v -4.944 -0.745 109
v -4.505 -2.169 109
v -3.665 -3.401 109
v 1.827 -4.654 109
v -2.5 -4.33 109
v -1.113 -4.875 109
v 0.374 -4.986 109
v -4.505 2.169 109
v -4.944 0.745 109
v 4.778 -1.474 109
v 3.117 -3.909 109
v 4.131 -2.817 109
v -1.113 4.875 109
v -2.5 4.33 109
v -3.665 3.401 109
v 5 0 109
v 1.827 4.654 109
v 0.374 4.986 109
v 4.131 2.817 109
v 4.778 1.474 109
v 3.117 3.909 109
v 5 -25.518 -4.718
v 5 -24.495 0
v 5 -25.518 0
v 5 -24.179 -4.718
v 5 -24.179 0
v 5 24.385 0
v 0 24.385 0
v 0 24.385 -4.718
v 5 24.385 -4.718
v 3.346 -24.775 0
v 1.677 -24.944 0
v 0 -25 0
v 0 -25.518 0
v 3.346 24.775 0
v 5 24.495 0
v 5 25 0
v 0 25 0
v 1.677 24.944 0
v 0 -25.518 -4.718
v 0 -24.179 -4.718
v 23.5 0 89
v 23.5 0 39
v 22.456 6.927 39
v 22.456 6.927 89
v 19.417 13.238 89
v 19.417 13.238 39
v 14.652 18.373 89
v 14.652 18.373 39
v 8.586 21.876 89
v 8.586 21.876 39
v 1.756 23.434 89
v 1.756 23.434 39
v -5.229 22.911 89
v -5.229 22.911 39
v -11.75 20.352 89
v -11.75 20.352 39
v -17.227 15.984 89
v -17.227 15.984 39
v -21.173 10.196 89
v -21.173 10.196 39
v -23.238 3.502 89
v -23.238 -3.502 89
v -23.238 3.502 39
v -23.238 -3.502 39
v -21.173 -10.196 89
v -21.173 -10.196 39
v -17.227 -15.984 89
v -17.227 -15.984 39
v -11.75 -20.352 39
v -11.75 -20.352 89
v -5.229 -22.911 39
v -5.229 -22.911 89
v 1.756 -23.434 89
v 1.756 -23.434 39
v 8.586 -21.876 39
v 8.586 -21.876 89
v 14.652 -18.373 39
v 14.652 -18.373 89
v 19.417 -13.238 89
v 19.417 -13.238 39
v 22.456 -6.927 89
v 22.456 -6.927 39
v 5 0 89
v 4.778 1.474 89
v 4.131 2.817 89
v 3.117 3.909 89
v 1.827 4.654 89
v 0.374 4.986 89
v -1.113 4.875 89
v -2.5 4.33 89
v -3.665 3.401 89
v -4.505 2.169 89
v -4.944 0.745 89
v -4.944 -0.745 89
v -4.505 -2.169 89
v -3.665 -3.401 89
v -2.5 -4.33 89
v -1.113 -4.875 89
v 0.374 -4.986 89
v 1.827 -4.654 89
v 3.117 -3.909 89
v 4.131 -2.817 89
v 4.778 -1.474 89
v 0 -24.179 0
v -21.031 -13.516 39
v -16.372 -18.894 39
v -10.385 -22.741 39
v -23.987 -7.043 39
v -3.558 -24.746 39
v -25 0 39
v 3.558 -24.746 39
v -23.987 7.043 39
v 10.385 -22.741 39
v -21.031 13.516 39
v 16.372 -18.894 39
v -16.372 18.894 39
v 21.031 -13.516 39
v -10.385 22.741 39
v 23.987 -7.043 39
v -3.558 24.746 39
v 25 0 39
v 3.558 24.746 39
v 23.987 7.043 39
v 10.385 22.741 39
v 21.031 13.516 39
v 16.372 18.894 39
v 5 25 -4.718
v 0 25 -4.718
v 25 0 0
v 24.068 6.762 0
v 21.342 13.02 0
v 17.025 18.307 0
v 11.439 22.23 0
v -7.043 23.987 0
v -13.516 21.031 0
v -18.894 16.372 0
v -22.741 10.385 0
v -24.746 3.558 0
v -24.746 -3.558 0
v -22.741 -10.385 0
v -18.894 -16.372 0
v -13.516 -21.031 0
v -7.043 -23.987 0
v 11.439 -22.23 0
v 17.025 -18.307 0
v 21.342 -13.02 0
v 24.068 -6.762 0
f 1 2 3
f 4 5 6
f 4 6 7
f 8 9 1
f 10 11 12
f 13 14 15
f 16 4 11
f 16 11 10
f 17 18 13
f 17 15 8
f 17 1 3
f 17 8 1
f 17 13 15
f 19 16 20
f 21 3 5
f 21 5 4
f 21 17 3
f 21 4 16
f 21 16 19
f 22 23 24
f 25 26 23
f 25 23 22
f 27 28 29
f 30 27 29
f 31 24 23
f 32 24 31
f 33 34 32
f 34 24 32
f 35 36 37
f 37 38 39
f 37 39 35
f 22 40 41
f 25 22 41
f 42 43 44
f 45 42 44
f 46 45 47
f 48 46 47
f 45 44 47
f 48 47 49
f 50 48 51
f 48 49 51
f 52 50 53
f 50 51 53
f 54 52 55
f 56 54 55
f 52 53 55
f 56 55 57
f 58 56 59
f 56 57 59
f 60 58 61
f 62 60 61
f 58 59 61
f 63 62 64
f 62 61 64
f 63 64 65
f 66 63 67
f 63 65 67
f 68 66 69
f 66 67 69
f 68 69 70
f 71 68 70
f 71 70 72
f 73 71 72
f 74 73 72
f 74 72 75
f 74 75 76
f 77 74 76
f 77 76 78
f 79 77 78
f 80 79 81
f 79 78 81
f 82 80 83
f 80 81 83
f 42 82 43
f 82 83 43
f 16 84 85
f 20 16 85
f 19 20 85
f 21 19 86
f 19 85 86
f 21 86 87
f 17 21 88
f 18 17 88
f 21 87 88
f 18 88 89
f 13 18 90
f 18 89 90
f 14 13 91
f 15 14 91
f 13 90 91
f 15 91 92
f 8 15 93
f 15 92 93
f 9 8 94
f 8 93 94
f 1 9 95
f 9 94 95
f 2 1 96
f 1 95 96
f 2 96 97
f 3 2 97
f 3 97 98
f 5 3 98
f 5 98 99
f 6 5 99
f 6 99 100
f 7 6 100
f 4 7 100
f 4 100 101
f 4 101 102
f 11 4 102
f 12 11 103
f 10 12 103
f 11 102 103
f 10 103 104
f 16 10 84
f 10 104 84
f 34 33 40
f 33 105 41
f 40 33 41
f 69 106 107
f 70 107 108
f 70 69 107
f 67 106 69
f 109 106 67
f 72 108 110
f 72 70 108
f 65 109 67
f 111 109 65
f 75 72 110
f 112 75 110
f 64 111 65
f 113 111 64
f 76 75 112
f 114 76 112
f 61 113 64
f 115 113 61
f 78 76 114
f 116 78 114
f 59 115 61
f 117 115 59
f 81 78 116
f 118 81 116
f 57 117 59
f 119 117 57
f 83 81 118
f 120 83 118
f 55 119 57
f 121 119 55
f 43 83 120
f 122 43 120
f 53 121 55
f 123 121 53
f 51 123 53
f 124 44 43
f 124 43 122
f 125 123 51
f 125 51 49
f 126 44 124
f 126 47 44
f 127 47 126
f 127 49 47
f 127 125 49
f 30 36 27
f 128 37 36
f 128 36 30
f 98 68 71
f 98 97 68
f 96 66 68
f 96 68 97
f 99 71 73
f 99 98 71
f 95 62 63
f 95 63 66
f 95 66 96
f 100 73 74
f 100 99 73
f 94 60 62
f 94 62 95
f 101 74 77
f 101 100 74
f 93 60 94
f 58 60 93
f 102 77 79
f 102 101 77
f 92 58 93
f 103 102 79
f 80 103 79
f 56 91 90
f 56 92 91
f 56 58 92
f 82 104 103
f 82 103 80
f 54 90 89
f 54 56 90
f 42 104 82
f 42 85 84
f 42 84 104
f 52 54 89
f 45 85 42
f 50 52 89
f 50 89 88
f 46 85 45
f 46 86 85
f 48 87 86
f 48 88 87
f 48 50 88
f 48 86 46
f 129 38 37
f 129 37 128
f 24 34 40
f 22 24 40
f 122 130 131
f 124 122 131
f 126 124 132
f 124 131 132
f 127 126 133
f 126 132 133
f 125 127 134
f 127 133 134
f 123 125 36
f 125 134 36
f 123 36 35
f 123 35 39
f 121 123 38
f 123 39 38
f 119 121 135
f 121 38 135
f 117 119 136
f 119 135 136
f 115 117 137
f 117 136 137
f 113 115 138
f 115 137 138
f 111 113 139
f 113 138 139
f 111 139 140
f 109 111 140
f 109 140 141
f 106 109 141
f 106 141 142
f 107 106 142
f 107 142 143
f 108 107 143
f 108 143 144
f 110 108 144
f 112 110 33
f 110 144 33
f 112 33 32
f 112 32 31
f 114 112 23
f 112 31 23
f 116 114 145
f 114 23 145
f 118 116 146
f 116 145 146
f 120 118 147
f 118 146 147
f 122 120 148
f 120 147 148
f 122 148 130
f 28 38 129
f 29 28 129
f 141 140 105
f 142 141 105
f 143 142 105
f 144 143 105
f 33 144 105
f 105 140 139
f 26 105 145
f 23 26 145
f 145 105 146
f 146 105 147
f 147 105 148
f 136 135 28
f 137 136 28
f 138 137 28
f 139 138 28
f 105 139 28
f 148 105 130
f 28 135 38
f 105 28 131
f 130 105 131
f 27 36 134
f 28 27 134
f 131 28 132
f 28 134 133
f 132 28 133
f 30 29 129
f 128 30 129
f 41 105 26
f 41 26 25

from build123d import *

# Parameters (mm, degrees)
SKETCH1_R           = 25
BOSS_EXTRUDE1_DEPTH = 39
SKETCH2_R           = 23.5
BOSS_EXTRUDE2_DEPTH = 50
SKETCH3_R           = 5
BOSS_EXTRUDE3_DEPTH = 20
SKETCH4_W           = 4.717886869
SKETCH4_H           = 0.61518364
SKETCH4_H_2         = 1.339282812
BOSS_EXTRUDE4_DEPTH = 5


with BuildPart() as part:
    # Sketch1 → Boss-Extrude1 (new body)
    with BuildSketch(Plane.XY):
        Circle(SKETCH1_R)
    extrude(amount=BOSS_EXTRUDE1_DEPTH)

    # Sketch2 → Boss-Extrude2 (add)
    with BuildSketch(Plane.XY.offset(39)):
        Circle(SKETCH2_R)
    extrude(amount=BOSS_EXTRUDE2_DEPTH)

    # Sketch3 → Boss-Extrude3 (add)
    with BuildSketch(Plane.XY.offset(89)):
        Circle(SKETCH3_R)
    extrude(amount=BOSS_EXTRUDE3_DEPTH)

    # Sketch4 → Boss-Extrude4 (add)
    with BuildSketch(Plane(origin=(0, 0, 0), x_dir=(0, 0, -1), z_dir=(1, 0, 0))):
        with Locations((2.358943434, 24.69240818)):
            Rectangle(SKETCH4_W, SKETCH4_H)
        with Locations((2.358943434, -24.848693341)):
            Rectangle(SKETCH4_W, SKETCH4_H_2)
    extrude(amount=BOSS_EXTRUDE4_DEPTH)


solid = part.part
